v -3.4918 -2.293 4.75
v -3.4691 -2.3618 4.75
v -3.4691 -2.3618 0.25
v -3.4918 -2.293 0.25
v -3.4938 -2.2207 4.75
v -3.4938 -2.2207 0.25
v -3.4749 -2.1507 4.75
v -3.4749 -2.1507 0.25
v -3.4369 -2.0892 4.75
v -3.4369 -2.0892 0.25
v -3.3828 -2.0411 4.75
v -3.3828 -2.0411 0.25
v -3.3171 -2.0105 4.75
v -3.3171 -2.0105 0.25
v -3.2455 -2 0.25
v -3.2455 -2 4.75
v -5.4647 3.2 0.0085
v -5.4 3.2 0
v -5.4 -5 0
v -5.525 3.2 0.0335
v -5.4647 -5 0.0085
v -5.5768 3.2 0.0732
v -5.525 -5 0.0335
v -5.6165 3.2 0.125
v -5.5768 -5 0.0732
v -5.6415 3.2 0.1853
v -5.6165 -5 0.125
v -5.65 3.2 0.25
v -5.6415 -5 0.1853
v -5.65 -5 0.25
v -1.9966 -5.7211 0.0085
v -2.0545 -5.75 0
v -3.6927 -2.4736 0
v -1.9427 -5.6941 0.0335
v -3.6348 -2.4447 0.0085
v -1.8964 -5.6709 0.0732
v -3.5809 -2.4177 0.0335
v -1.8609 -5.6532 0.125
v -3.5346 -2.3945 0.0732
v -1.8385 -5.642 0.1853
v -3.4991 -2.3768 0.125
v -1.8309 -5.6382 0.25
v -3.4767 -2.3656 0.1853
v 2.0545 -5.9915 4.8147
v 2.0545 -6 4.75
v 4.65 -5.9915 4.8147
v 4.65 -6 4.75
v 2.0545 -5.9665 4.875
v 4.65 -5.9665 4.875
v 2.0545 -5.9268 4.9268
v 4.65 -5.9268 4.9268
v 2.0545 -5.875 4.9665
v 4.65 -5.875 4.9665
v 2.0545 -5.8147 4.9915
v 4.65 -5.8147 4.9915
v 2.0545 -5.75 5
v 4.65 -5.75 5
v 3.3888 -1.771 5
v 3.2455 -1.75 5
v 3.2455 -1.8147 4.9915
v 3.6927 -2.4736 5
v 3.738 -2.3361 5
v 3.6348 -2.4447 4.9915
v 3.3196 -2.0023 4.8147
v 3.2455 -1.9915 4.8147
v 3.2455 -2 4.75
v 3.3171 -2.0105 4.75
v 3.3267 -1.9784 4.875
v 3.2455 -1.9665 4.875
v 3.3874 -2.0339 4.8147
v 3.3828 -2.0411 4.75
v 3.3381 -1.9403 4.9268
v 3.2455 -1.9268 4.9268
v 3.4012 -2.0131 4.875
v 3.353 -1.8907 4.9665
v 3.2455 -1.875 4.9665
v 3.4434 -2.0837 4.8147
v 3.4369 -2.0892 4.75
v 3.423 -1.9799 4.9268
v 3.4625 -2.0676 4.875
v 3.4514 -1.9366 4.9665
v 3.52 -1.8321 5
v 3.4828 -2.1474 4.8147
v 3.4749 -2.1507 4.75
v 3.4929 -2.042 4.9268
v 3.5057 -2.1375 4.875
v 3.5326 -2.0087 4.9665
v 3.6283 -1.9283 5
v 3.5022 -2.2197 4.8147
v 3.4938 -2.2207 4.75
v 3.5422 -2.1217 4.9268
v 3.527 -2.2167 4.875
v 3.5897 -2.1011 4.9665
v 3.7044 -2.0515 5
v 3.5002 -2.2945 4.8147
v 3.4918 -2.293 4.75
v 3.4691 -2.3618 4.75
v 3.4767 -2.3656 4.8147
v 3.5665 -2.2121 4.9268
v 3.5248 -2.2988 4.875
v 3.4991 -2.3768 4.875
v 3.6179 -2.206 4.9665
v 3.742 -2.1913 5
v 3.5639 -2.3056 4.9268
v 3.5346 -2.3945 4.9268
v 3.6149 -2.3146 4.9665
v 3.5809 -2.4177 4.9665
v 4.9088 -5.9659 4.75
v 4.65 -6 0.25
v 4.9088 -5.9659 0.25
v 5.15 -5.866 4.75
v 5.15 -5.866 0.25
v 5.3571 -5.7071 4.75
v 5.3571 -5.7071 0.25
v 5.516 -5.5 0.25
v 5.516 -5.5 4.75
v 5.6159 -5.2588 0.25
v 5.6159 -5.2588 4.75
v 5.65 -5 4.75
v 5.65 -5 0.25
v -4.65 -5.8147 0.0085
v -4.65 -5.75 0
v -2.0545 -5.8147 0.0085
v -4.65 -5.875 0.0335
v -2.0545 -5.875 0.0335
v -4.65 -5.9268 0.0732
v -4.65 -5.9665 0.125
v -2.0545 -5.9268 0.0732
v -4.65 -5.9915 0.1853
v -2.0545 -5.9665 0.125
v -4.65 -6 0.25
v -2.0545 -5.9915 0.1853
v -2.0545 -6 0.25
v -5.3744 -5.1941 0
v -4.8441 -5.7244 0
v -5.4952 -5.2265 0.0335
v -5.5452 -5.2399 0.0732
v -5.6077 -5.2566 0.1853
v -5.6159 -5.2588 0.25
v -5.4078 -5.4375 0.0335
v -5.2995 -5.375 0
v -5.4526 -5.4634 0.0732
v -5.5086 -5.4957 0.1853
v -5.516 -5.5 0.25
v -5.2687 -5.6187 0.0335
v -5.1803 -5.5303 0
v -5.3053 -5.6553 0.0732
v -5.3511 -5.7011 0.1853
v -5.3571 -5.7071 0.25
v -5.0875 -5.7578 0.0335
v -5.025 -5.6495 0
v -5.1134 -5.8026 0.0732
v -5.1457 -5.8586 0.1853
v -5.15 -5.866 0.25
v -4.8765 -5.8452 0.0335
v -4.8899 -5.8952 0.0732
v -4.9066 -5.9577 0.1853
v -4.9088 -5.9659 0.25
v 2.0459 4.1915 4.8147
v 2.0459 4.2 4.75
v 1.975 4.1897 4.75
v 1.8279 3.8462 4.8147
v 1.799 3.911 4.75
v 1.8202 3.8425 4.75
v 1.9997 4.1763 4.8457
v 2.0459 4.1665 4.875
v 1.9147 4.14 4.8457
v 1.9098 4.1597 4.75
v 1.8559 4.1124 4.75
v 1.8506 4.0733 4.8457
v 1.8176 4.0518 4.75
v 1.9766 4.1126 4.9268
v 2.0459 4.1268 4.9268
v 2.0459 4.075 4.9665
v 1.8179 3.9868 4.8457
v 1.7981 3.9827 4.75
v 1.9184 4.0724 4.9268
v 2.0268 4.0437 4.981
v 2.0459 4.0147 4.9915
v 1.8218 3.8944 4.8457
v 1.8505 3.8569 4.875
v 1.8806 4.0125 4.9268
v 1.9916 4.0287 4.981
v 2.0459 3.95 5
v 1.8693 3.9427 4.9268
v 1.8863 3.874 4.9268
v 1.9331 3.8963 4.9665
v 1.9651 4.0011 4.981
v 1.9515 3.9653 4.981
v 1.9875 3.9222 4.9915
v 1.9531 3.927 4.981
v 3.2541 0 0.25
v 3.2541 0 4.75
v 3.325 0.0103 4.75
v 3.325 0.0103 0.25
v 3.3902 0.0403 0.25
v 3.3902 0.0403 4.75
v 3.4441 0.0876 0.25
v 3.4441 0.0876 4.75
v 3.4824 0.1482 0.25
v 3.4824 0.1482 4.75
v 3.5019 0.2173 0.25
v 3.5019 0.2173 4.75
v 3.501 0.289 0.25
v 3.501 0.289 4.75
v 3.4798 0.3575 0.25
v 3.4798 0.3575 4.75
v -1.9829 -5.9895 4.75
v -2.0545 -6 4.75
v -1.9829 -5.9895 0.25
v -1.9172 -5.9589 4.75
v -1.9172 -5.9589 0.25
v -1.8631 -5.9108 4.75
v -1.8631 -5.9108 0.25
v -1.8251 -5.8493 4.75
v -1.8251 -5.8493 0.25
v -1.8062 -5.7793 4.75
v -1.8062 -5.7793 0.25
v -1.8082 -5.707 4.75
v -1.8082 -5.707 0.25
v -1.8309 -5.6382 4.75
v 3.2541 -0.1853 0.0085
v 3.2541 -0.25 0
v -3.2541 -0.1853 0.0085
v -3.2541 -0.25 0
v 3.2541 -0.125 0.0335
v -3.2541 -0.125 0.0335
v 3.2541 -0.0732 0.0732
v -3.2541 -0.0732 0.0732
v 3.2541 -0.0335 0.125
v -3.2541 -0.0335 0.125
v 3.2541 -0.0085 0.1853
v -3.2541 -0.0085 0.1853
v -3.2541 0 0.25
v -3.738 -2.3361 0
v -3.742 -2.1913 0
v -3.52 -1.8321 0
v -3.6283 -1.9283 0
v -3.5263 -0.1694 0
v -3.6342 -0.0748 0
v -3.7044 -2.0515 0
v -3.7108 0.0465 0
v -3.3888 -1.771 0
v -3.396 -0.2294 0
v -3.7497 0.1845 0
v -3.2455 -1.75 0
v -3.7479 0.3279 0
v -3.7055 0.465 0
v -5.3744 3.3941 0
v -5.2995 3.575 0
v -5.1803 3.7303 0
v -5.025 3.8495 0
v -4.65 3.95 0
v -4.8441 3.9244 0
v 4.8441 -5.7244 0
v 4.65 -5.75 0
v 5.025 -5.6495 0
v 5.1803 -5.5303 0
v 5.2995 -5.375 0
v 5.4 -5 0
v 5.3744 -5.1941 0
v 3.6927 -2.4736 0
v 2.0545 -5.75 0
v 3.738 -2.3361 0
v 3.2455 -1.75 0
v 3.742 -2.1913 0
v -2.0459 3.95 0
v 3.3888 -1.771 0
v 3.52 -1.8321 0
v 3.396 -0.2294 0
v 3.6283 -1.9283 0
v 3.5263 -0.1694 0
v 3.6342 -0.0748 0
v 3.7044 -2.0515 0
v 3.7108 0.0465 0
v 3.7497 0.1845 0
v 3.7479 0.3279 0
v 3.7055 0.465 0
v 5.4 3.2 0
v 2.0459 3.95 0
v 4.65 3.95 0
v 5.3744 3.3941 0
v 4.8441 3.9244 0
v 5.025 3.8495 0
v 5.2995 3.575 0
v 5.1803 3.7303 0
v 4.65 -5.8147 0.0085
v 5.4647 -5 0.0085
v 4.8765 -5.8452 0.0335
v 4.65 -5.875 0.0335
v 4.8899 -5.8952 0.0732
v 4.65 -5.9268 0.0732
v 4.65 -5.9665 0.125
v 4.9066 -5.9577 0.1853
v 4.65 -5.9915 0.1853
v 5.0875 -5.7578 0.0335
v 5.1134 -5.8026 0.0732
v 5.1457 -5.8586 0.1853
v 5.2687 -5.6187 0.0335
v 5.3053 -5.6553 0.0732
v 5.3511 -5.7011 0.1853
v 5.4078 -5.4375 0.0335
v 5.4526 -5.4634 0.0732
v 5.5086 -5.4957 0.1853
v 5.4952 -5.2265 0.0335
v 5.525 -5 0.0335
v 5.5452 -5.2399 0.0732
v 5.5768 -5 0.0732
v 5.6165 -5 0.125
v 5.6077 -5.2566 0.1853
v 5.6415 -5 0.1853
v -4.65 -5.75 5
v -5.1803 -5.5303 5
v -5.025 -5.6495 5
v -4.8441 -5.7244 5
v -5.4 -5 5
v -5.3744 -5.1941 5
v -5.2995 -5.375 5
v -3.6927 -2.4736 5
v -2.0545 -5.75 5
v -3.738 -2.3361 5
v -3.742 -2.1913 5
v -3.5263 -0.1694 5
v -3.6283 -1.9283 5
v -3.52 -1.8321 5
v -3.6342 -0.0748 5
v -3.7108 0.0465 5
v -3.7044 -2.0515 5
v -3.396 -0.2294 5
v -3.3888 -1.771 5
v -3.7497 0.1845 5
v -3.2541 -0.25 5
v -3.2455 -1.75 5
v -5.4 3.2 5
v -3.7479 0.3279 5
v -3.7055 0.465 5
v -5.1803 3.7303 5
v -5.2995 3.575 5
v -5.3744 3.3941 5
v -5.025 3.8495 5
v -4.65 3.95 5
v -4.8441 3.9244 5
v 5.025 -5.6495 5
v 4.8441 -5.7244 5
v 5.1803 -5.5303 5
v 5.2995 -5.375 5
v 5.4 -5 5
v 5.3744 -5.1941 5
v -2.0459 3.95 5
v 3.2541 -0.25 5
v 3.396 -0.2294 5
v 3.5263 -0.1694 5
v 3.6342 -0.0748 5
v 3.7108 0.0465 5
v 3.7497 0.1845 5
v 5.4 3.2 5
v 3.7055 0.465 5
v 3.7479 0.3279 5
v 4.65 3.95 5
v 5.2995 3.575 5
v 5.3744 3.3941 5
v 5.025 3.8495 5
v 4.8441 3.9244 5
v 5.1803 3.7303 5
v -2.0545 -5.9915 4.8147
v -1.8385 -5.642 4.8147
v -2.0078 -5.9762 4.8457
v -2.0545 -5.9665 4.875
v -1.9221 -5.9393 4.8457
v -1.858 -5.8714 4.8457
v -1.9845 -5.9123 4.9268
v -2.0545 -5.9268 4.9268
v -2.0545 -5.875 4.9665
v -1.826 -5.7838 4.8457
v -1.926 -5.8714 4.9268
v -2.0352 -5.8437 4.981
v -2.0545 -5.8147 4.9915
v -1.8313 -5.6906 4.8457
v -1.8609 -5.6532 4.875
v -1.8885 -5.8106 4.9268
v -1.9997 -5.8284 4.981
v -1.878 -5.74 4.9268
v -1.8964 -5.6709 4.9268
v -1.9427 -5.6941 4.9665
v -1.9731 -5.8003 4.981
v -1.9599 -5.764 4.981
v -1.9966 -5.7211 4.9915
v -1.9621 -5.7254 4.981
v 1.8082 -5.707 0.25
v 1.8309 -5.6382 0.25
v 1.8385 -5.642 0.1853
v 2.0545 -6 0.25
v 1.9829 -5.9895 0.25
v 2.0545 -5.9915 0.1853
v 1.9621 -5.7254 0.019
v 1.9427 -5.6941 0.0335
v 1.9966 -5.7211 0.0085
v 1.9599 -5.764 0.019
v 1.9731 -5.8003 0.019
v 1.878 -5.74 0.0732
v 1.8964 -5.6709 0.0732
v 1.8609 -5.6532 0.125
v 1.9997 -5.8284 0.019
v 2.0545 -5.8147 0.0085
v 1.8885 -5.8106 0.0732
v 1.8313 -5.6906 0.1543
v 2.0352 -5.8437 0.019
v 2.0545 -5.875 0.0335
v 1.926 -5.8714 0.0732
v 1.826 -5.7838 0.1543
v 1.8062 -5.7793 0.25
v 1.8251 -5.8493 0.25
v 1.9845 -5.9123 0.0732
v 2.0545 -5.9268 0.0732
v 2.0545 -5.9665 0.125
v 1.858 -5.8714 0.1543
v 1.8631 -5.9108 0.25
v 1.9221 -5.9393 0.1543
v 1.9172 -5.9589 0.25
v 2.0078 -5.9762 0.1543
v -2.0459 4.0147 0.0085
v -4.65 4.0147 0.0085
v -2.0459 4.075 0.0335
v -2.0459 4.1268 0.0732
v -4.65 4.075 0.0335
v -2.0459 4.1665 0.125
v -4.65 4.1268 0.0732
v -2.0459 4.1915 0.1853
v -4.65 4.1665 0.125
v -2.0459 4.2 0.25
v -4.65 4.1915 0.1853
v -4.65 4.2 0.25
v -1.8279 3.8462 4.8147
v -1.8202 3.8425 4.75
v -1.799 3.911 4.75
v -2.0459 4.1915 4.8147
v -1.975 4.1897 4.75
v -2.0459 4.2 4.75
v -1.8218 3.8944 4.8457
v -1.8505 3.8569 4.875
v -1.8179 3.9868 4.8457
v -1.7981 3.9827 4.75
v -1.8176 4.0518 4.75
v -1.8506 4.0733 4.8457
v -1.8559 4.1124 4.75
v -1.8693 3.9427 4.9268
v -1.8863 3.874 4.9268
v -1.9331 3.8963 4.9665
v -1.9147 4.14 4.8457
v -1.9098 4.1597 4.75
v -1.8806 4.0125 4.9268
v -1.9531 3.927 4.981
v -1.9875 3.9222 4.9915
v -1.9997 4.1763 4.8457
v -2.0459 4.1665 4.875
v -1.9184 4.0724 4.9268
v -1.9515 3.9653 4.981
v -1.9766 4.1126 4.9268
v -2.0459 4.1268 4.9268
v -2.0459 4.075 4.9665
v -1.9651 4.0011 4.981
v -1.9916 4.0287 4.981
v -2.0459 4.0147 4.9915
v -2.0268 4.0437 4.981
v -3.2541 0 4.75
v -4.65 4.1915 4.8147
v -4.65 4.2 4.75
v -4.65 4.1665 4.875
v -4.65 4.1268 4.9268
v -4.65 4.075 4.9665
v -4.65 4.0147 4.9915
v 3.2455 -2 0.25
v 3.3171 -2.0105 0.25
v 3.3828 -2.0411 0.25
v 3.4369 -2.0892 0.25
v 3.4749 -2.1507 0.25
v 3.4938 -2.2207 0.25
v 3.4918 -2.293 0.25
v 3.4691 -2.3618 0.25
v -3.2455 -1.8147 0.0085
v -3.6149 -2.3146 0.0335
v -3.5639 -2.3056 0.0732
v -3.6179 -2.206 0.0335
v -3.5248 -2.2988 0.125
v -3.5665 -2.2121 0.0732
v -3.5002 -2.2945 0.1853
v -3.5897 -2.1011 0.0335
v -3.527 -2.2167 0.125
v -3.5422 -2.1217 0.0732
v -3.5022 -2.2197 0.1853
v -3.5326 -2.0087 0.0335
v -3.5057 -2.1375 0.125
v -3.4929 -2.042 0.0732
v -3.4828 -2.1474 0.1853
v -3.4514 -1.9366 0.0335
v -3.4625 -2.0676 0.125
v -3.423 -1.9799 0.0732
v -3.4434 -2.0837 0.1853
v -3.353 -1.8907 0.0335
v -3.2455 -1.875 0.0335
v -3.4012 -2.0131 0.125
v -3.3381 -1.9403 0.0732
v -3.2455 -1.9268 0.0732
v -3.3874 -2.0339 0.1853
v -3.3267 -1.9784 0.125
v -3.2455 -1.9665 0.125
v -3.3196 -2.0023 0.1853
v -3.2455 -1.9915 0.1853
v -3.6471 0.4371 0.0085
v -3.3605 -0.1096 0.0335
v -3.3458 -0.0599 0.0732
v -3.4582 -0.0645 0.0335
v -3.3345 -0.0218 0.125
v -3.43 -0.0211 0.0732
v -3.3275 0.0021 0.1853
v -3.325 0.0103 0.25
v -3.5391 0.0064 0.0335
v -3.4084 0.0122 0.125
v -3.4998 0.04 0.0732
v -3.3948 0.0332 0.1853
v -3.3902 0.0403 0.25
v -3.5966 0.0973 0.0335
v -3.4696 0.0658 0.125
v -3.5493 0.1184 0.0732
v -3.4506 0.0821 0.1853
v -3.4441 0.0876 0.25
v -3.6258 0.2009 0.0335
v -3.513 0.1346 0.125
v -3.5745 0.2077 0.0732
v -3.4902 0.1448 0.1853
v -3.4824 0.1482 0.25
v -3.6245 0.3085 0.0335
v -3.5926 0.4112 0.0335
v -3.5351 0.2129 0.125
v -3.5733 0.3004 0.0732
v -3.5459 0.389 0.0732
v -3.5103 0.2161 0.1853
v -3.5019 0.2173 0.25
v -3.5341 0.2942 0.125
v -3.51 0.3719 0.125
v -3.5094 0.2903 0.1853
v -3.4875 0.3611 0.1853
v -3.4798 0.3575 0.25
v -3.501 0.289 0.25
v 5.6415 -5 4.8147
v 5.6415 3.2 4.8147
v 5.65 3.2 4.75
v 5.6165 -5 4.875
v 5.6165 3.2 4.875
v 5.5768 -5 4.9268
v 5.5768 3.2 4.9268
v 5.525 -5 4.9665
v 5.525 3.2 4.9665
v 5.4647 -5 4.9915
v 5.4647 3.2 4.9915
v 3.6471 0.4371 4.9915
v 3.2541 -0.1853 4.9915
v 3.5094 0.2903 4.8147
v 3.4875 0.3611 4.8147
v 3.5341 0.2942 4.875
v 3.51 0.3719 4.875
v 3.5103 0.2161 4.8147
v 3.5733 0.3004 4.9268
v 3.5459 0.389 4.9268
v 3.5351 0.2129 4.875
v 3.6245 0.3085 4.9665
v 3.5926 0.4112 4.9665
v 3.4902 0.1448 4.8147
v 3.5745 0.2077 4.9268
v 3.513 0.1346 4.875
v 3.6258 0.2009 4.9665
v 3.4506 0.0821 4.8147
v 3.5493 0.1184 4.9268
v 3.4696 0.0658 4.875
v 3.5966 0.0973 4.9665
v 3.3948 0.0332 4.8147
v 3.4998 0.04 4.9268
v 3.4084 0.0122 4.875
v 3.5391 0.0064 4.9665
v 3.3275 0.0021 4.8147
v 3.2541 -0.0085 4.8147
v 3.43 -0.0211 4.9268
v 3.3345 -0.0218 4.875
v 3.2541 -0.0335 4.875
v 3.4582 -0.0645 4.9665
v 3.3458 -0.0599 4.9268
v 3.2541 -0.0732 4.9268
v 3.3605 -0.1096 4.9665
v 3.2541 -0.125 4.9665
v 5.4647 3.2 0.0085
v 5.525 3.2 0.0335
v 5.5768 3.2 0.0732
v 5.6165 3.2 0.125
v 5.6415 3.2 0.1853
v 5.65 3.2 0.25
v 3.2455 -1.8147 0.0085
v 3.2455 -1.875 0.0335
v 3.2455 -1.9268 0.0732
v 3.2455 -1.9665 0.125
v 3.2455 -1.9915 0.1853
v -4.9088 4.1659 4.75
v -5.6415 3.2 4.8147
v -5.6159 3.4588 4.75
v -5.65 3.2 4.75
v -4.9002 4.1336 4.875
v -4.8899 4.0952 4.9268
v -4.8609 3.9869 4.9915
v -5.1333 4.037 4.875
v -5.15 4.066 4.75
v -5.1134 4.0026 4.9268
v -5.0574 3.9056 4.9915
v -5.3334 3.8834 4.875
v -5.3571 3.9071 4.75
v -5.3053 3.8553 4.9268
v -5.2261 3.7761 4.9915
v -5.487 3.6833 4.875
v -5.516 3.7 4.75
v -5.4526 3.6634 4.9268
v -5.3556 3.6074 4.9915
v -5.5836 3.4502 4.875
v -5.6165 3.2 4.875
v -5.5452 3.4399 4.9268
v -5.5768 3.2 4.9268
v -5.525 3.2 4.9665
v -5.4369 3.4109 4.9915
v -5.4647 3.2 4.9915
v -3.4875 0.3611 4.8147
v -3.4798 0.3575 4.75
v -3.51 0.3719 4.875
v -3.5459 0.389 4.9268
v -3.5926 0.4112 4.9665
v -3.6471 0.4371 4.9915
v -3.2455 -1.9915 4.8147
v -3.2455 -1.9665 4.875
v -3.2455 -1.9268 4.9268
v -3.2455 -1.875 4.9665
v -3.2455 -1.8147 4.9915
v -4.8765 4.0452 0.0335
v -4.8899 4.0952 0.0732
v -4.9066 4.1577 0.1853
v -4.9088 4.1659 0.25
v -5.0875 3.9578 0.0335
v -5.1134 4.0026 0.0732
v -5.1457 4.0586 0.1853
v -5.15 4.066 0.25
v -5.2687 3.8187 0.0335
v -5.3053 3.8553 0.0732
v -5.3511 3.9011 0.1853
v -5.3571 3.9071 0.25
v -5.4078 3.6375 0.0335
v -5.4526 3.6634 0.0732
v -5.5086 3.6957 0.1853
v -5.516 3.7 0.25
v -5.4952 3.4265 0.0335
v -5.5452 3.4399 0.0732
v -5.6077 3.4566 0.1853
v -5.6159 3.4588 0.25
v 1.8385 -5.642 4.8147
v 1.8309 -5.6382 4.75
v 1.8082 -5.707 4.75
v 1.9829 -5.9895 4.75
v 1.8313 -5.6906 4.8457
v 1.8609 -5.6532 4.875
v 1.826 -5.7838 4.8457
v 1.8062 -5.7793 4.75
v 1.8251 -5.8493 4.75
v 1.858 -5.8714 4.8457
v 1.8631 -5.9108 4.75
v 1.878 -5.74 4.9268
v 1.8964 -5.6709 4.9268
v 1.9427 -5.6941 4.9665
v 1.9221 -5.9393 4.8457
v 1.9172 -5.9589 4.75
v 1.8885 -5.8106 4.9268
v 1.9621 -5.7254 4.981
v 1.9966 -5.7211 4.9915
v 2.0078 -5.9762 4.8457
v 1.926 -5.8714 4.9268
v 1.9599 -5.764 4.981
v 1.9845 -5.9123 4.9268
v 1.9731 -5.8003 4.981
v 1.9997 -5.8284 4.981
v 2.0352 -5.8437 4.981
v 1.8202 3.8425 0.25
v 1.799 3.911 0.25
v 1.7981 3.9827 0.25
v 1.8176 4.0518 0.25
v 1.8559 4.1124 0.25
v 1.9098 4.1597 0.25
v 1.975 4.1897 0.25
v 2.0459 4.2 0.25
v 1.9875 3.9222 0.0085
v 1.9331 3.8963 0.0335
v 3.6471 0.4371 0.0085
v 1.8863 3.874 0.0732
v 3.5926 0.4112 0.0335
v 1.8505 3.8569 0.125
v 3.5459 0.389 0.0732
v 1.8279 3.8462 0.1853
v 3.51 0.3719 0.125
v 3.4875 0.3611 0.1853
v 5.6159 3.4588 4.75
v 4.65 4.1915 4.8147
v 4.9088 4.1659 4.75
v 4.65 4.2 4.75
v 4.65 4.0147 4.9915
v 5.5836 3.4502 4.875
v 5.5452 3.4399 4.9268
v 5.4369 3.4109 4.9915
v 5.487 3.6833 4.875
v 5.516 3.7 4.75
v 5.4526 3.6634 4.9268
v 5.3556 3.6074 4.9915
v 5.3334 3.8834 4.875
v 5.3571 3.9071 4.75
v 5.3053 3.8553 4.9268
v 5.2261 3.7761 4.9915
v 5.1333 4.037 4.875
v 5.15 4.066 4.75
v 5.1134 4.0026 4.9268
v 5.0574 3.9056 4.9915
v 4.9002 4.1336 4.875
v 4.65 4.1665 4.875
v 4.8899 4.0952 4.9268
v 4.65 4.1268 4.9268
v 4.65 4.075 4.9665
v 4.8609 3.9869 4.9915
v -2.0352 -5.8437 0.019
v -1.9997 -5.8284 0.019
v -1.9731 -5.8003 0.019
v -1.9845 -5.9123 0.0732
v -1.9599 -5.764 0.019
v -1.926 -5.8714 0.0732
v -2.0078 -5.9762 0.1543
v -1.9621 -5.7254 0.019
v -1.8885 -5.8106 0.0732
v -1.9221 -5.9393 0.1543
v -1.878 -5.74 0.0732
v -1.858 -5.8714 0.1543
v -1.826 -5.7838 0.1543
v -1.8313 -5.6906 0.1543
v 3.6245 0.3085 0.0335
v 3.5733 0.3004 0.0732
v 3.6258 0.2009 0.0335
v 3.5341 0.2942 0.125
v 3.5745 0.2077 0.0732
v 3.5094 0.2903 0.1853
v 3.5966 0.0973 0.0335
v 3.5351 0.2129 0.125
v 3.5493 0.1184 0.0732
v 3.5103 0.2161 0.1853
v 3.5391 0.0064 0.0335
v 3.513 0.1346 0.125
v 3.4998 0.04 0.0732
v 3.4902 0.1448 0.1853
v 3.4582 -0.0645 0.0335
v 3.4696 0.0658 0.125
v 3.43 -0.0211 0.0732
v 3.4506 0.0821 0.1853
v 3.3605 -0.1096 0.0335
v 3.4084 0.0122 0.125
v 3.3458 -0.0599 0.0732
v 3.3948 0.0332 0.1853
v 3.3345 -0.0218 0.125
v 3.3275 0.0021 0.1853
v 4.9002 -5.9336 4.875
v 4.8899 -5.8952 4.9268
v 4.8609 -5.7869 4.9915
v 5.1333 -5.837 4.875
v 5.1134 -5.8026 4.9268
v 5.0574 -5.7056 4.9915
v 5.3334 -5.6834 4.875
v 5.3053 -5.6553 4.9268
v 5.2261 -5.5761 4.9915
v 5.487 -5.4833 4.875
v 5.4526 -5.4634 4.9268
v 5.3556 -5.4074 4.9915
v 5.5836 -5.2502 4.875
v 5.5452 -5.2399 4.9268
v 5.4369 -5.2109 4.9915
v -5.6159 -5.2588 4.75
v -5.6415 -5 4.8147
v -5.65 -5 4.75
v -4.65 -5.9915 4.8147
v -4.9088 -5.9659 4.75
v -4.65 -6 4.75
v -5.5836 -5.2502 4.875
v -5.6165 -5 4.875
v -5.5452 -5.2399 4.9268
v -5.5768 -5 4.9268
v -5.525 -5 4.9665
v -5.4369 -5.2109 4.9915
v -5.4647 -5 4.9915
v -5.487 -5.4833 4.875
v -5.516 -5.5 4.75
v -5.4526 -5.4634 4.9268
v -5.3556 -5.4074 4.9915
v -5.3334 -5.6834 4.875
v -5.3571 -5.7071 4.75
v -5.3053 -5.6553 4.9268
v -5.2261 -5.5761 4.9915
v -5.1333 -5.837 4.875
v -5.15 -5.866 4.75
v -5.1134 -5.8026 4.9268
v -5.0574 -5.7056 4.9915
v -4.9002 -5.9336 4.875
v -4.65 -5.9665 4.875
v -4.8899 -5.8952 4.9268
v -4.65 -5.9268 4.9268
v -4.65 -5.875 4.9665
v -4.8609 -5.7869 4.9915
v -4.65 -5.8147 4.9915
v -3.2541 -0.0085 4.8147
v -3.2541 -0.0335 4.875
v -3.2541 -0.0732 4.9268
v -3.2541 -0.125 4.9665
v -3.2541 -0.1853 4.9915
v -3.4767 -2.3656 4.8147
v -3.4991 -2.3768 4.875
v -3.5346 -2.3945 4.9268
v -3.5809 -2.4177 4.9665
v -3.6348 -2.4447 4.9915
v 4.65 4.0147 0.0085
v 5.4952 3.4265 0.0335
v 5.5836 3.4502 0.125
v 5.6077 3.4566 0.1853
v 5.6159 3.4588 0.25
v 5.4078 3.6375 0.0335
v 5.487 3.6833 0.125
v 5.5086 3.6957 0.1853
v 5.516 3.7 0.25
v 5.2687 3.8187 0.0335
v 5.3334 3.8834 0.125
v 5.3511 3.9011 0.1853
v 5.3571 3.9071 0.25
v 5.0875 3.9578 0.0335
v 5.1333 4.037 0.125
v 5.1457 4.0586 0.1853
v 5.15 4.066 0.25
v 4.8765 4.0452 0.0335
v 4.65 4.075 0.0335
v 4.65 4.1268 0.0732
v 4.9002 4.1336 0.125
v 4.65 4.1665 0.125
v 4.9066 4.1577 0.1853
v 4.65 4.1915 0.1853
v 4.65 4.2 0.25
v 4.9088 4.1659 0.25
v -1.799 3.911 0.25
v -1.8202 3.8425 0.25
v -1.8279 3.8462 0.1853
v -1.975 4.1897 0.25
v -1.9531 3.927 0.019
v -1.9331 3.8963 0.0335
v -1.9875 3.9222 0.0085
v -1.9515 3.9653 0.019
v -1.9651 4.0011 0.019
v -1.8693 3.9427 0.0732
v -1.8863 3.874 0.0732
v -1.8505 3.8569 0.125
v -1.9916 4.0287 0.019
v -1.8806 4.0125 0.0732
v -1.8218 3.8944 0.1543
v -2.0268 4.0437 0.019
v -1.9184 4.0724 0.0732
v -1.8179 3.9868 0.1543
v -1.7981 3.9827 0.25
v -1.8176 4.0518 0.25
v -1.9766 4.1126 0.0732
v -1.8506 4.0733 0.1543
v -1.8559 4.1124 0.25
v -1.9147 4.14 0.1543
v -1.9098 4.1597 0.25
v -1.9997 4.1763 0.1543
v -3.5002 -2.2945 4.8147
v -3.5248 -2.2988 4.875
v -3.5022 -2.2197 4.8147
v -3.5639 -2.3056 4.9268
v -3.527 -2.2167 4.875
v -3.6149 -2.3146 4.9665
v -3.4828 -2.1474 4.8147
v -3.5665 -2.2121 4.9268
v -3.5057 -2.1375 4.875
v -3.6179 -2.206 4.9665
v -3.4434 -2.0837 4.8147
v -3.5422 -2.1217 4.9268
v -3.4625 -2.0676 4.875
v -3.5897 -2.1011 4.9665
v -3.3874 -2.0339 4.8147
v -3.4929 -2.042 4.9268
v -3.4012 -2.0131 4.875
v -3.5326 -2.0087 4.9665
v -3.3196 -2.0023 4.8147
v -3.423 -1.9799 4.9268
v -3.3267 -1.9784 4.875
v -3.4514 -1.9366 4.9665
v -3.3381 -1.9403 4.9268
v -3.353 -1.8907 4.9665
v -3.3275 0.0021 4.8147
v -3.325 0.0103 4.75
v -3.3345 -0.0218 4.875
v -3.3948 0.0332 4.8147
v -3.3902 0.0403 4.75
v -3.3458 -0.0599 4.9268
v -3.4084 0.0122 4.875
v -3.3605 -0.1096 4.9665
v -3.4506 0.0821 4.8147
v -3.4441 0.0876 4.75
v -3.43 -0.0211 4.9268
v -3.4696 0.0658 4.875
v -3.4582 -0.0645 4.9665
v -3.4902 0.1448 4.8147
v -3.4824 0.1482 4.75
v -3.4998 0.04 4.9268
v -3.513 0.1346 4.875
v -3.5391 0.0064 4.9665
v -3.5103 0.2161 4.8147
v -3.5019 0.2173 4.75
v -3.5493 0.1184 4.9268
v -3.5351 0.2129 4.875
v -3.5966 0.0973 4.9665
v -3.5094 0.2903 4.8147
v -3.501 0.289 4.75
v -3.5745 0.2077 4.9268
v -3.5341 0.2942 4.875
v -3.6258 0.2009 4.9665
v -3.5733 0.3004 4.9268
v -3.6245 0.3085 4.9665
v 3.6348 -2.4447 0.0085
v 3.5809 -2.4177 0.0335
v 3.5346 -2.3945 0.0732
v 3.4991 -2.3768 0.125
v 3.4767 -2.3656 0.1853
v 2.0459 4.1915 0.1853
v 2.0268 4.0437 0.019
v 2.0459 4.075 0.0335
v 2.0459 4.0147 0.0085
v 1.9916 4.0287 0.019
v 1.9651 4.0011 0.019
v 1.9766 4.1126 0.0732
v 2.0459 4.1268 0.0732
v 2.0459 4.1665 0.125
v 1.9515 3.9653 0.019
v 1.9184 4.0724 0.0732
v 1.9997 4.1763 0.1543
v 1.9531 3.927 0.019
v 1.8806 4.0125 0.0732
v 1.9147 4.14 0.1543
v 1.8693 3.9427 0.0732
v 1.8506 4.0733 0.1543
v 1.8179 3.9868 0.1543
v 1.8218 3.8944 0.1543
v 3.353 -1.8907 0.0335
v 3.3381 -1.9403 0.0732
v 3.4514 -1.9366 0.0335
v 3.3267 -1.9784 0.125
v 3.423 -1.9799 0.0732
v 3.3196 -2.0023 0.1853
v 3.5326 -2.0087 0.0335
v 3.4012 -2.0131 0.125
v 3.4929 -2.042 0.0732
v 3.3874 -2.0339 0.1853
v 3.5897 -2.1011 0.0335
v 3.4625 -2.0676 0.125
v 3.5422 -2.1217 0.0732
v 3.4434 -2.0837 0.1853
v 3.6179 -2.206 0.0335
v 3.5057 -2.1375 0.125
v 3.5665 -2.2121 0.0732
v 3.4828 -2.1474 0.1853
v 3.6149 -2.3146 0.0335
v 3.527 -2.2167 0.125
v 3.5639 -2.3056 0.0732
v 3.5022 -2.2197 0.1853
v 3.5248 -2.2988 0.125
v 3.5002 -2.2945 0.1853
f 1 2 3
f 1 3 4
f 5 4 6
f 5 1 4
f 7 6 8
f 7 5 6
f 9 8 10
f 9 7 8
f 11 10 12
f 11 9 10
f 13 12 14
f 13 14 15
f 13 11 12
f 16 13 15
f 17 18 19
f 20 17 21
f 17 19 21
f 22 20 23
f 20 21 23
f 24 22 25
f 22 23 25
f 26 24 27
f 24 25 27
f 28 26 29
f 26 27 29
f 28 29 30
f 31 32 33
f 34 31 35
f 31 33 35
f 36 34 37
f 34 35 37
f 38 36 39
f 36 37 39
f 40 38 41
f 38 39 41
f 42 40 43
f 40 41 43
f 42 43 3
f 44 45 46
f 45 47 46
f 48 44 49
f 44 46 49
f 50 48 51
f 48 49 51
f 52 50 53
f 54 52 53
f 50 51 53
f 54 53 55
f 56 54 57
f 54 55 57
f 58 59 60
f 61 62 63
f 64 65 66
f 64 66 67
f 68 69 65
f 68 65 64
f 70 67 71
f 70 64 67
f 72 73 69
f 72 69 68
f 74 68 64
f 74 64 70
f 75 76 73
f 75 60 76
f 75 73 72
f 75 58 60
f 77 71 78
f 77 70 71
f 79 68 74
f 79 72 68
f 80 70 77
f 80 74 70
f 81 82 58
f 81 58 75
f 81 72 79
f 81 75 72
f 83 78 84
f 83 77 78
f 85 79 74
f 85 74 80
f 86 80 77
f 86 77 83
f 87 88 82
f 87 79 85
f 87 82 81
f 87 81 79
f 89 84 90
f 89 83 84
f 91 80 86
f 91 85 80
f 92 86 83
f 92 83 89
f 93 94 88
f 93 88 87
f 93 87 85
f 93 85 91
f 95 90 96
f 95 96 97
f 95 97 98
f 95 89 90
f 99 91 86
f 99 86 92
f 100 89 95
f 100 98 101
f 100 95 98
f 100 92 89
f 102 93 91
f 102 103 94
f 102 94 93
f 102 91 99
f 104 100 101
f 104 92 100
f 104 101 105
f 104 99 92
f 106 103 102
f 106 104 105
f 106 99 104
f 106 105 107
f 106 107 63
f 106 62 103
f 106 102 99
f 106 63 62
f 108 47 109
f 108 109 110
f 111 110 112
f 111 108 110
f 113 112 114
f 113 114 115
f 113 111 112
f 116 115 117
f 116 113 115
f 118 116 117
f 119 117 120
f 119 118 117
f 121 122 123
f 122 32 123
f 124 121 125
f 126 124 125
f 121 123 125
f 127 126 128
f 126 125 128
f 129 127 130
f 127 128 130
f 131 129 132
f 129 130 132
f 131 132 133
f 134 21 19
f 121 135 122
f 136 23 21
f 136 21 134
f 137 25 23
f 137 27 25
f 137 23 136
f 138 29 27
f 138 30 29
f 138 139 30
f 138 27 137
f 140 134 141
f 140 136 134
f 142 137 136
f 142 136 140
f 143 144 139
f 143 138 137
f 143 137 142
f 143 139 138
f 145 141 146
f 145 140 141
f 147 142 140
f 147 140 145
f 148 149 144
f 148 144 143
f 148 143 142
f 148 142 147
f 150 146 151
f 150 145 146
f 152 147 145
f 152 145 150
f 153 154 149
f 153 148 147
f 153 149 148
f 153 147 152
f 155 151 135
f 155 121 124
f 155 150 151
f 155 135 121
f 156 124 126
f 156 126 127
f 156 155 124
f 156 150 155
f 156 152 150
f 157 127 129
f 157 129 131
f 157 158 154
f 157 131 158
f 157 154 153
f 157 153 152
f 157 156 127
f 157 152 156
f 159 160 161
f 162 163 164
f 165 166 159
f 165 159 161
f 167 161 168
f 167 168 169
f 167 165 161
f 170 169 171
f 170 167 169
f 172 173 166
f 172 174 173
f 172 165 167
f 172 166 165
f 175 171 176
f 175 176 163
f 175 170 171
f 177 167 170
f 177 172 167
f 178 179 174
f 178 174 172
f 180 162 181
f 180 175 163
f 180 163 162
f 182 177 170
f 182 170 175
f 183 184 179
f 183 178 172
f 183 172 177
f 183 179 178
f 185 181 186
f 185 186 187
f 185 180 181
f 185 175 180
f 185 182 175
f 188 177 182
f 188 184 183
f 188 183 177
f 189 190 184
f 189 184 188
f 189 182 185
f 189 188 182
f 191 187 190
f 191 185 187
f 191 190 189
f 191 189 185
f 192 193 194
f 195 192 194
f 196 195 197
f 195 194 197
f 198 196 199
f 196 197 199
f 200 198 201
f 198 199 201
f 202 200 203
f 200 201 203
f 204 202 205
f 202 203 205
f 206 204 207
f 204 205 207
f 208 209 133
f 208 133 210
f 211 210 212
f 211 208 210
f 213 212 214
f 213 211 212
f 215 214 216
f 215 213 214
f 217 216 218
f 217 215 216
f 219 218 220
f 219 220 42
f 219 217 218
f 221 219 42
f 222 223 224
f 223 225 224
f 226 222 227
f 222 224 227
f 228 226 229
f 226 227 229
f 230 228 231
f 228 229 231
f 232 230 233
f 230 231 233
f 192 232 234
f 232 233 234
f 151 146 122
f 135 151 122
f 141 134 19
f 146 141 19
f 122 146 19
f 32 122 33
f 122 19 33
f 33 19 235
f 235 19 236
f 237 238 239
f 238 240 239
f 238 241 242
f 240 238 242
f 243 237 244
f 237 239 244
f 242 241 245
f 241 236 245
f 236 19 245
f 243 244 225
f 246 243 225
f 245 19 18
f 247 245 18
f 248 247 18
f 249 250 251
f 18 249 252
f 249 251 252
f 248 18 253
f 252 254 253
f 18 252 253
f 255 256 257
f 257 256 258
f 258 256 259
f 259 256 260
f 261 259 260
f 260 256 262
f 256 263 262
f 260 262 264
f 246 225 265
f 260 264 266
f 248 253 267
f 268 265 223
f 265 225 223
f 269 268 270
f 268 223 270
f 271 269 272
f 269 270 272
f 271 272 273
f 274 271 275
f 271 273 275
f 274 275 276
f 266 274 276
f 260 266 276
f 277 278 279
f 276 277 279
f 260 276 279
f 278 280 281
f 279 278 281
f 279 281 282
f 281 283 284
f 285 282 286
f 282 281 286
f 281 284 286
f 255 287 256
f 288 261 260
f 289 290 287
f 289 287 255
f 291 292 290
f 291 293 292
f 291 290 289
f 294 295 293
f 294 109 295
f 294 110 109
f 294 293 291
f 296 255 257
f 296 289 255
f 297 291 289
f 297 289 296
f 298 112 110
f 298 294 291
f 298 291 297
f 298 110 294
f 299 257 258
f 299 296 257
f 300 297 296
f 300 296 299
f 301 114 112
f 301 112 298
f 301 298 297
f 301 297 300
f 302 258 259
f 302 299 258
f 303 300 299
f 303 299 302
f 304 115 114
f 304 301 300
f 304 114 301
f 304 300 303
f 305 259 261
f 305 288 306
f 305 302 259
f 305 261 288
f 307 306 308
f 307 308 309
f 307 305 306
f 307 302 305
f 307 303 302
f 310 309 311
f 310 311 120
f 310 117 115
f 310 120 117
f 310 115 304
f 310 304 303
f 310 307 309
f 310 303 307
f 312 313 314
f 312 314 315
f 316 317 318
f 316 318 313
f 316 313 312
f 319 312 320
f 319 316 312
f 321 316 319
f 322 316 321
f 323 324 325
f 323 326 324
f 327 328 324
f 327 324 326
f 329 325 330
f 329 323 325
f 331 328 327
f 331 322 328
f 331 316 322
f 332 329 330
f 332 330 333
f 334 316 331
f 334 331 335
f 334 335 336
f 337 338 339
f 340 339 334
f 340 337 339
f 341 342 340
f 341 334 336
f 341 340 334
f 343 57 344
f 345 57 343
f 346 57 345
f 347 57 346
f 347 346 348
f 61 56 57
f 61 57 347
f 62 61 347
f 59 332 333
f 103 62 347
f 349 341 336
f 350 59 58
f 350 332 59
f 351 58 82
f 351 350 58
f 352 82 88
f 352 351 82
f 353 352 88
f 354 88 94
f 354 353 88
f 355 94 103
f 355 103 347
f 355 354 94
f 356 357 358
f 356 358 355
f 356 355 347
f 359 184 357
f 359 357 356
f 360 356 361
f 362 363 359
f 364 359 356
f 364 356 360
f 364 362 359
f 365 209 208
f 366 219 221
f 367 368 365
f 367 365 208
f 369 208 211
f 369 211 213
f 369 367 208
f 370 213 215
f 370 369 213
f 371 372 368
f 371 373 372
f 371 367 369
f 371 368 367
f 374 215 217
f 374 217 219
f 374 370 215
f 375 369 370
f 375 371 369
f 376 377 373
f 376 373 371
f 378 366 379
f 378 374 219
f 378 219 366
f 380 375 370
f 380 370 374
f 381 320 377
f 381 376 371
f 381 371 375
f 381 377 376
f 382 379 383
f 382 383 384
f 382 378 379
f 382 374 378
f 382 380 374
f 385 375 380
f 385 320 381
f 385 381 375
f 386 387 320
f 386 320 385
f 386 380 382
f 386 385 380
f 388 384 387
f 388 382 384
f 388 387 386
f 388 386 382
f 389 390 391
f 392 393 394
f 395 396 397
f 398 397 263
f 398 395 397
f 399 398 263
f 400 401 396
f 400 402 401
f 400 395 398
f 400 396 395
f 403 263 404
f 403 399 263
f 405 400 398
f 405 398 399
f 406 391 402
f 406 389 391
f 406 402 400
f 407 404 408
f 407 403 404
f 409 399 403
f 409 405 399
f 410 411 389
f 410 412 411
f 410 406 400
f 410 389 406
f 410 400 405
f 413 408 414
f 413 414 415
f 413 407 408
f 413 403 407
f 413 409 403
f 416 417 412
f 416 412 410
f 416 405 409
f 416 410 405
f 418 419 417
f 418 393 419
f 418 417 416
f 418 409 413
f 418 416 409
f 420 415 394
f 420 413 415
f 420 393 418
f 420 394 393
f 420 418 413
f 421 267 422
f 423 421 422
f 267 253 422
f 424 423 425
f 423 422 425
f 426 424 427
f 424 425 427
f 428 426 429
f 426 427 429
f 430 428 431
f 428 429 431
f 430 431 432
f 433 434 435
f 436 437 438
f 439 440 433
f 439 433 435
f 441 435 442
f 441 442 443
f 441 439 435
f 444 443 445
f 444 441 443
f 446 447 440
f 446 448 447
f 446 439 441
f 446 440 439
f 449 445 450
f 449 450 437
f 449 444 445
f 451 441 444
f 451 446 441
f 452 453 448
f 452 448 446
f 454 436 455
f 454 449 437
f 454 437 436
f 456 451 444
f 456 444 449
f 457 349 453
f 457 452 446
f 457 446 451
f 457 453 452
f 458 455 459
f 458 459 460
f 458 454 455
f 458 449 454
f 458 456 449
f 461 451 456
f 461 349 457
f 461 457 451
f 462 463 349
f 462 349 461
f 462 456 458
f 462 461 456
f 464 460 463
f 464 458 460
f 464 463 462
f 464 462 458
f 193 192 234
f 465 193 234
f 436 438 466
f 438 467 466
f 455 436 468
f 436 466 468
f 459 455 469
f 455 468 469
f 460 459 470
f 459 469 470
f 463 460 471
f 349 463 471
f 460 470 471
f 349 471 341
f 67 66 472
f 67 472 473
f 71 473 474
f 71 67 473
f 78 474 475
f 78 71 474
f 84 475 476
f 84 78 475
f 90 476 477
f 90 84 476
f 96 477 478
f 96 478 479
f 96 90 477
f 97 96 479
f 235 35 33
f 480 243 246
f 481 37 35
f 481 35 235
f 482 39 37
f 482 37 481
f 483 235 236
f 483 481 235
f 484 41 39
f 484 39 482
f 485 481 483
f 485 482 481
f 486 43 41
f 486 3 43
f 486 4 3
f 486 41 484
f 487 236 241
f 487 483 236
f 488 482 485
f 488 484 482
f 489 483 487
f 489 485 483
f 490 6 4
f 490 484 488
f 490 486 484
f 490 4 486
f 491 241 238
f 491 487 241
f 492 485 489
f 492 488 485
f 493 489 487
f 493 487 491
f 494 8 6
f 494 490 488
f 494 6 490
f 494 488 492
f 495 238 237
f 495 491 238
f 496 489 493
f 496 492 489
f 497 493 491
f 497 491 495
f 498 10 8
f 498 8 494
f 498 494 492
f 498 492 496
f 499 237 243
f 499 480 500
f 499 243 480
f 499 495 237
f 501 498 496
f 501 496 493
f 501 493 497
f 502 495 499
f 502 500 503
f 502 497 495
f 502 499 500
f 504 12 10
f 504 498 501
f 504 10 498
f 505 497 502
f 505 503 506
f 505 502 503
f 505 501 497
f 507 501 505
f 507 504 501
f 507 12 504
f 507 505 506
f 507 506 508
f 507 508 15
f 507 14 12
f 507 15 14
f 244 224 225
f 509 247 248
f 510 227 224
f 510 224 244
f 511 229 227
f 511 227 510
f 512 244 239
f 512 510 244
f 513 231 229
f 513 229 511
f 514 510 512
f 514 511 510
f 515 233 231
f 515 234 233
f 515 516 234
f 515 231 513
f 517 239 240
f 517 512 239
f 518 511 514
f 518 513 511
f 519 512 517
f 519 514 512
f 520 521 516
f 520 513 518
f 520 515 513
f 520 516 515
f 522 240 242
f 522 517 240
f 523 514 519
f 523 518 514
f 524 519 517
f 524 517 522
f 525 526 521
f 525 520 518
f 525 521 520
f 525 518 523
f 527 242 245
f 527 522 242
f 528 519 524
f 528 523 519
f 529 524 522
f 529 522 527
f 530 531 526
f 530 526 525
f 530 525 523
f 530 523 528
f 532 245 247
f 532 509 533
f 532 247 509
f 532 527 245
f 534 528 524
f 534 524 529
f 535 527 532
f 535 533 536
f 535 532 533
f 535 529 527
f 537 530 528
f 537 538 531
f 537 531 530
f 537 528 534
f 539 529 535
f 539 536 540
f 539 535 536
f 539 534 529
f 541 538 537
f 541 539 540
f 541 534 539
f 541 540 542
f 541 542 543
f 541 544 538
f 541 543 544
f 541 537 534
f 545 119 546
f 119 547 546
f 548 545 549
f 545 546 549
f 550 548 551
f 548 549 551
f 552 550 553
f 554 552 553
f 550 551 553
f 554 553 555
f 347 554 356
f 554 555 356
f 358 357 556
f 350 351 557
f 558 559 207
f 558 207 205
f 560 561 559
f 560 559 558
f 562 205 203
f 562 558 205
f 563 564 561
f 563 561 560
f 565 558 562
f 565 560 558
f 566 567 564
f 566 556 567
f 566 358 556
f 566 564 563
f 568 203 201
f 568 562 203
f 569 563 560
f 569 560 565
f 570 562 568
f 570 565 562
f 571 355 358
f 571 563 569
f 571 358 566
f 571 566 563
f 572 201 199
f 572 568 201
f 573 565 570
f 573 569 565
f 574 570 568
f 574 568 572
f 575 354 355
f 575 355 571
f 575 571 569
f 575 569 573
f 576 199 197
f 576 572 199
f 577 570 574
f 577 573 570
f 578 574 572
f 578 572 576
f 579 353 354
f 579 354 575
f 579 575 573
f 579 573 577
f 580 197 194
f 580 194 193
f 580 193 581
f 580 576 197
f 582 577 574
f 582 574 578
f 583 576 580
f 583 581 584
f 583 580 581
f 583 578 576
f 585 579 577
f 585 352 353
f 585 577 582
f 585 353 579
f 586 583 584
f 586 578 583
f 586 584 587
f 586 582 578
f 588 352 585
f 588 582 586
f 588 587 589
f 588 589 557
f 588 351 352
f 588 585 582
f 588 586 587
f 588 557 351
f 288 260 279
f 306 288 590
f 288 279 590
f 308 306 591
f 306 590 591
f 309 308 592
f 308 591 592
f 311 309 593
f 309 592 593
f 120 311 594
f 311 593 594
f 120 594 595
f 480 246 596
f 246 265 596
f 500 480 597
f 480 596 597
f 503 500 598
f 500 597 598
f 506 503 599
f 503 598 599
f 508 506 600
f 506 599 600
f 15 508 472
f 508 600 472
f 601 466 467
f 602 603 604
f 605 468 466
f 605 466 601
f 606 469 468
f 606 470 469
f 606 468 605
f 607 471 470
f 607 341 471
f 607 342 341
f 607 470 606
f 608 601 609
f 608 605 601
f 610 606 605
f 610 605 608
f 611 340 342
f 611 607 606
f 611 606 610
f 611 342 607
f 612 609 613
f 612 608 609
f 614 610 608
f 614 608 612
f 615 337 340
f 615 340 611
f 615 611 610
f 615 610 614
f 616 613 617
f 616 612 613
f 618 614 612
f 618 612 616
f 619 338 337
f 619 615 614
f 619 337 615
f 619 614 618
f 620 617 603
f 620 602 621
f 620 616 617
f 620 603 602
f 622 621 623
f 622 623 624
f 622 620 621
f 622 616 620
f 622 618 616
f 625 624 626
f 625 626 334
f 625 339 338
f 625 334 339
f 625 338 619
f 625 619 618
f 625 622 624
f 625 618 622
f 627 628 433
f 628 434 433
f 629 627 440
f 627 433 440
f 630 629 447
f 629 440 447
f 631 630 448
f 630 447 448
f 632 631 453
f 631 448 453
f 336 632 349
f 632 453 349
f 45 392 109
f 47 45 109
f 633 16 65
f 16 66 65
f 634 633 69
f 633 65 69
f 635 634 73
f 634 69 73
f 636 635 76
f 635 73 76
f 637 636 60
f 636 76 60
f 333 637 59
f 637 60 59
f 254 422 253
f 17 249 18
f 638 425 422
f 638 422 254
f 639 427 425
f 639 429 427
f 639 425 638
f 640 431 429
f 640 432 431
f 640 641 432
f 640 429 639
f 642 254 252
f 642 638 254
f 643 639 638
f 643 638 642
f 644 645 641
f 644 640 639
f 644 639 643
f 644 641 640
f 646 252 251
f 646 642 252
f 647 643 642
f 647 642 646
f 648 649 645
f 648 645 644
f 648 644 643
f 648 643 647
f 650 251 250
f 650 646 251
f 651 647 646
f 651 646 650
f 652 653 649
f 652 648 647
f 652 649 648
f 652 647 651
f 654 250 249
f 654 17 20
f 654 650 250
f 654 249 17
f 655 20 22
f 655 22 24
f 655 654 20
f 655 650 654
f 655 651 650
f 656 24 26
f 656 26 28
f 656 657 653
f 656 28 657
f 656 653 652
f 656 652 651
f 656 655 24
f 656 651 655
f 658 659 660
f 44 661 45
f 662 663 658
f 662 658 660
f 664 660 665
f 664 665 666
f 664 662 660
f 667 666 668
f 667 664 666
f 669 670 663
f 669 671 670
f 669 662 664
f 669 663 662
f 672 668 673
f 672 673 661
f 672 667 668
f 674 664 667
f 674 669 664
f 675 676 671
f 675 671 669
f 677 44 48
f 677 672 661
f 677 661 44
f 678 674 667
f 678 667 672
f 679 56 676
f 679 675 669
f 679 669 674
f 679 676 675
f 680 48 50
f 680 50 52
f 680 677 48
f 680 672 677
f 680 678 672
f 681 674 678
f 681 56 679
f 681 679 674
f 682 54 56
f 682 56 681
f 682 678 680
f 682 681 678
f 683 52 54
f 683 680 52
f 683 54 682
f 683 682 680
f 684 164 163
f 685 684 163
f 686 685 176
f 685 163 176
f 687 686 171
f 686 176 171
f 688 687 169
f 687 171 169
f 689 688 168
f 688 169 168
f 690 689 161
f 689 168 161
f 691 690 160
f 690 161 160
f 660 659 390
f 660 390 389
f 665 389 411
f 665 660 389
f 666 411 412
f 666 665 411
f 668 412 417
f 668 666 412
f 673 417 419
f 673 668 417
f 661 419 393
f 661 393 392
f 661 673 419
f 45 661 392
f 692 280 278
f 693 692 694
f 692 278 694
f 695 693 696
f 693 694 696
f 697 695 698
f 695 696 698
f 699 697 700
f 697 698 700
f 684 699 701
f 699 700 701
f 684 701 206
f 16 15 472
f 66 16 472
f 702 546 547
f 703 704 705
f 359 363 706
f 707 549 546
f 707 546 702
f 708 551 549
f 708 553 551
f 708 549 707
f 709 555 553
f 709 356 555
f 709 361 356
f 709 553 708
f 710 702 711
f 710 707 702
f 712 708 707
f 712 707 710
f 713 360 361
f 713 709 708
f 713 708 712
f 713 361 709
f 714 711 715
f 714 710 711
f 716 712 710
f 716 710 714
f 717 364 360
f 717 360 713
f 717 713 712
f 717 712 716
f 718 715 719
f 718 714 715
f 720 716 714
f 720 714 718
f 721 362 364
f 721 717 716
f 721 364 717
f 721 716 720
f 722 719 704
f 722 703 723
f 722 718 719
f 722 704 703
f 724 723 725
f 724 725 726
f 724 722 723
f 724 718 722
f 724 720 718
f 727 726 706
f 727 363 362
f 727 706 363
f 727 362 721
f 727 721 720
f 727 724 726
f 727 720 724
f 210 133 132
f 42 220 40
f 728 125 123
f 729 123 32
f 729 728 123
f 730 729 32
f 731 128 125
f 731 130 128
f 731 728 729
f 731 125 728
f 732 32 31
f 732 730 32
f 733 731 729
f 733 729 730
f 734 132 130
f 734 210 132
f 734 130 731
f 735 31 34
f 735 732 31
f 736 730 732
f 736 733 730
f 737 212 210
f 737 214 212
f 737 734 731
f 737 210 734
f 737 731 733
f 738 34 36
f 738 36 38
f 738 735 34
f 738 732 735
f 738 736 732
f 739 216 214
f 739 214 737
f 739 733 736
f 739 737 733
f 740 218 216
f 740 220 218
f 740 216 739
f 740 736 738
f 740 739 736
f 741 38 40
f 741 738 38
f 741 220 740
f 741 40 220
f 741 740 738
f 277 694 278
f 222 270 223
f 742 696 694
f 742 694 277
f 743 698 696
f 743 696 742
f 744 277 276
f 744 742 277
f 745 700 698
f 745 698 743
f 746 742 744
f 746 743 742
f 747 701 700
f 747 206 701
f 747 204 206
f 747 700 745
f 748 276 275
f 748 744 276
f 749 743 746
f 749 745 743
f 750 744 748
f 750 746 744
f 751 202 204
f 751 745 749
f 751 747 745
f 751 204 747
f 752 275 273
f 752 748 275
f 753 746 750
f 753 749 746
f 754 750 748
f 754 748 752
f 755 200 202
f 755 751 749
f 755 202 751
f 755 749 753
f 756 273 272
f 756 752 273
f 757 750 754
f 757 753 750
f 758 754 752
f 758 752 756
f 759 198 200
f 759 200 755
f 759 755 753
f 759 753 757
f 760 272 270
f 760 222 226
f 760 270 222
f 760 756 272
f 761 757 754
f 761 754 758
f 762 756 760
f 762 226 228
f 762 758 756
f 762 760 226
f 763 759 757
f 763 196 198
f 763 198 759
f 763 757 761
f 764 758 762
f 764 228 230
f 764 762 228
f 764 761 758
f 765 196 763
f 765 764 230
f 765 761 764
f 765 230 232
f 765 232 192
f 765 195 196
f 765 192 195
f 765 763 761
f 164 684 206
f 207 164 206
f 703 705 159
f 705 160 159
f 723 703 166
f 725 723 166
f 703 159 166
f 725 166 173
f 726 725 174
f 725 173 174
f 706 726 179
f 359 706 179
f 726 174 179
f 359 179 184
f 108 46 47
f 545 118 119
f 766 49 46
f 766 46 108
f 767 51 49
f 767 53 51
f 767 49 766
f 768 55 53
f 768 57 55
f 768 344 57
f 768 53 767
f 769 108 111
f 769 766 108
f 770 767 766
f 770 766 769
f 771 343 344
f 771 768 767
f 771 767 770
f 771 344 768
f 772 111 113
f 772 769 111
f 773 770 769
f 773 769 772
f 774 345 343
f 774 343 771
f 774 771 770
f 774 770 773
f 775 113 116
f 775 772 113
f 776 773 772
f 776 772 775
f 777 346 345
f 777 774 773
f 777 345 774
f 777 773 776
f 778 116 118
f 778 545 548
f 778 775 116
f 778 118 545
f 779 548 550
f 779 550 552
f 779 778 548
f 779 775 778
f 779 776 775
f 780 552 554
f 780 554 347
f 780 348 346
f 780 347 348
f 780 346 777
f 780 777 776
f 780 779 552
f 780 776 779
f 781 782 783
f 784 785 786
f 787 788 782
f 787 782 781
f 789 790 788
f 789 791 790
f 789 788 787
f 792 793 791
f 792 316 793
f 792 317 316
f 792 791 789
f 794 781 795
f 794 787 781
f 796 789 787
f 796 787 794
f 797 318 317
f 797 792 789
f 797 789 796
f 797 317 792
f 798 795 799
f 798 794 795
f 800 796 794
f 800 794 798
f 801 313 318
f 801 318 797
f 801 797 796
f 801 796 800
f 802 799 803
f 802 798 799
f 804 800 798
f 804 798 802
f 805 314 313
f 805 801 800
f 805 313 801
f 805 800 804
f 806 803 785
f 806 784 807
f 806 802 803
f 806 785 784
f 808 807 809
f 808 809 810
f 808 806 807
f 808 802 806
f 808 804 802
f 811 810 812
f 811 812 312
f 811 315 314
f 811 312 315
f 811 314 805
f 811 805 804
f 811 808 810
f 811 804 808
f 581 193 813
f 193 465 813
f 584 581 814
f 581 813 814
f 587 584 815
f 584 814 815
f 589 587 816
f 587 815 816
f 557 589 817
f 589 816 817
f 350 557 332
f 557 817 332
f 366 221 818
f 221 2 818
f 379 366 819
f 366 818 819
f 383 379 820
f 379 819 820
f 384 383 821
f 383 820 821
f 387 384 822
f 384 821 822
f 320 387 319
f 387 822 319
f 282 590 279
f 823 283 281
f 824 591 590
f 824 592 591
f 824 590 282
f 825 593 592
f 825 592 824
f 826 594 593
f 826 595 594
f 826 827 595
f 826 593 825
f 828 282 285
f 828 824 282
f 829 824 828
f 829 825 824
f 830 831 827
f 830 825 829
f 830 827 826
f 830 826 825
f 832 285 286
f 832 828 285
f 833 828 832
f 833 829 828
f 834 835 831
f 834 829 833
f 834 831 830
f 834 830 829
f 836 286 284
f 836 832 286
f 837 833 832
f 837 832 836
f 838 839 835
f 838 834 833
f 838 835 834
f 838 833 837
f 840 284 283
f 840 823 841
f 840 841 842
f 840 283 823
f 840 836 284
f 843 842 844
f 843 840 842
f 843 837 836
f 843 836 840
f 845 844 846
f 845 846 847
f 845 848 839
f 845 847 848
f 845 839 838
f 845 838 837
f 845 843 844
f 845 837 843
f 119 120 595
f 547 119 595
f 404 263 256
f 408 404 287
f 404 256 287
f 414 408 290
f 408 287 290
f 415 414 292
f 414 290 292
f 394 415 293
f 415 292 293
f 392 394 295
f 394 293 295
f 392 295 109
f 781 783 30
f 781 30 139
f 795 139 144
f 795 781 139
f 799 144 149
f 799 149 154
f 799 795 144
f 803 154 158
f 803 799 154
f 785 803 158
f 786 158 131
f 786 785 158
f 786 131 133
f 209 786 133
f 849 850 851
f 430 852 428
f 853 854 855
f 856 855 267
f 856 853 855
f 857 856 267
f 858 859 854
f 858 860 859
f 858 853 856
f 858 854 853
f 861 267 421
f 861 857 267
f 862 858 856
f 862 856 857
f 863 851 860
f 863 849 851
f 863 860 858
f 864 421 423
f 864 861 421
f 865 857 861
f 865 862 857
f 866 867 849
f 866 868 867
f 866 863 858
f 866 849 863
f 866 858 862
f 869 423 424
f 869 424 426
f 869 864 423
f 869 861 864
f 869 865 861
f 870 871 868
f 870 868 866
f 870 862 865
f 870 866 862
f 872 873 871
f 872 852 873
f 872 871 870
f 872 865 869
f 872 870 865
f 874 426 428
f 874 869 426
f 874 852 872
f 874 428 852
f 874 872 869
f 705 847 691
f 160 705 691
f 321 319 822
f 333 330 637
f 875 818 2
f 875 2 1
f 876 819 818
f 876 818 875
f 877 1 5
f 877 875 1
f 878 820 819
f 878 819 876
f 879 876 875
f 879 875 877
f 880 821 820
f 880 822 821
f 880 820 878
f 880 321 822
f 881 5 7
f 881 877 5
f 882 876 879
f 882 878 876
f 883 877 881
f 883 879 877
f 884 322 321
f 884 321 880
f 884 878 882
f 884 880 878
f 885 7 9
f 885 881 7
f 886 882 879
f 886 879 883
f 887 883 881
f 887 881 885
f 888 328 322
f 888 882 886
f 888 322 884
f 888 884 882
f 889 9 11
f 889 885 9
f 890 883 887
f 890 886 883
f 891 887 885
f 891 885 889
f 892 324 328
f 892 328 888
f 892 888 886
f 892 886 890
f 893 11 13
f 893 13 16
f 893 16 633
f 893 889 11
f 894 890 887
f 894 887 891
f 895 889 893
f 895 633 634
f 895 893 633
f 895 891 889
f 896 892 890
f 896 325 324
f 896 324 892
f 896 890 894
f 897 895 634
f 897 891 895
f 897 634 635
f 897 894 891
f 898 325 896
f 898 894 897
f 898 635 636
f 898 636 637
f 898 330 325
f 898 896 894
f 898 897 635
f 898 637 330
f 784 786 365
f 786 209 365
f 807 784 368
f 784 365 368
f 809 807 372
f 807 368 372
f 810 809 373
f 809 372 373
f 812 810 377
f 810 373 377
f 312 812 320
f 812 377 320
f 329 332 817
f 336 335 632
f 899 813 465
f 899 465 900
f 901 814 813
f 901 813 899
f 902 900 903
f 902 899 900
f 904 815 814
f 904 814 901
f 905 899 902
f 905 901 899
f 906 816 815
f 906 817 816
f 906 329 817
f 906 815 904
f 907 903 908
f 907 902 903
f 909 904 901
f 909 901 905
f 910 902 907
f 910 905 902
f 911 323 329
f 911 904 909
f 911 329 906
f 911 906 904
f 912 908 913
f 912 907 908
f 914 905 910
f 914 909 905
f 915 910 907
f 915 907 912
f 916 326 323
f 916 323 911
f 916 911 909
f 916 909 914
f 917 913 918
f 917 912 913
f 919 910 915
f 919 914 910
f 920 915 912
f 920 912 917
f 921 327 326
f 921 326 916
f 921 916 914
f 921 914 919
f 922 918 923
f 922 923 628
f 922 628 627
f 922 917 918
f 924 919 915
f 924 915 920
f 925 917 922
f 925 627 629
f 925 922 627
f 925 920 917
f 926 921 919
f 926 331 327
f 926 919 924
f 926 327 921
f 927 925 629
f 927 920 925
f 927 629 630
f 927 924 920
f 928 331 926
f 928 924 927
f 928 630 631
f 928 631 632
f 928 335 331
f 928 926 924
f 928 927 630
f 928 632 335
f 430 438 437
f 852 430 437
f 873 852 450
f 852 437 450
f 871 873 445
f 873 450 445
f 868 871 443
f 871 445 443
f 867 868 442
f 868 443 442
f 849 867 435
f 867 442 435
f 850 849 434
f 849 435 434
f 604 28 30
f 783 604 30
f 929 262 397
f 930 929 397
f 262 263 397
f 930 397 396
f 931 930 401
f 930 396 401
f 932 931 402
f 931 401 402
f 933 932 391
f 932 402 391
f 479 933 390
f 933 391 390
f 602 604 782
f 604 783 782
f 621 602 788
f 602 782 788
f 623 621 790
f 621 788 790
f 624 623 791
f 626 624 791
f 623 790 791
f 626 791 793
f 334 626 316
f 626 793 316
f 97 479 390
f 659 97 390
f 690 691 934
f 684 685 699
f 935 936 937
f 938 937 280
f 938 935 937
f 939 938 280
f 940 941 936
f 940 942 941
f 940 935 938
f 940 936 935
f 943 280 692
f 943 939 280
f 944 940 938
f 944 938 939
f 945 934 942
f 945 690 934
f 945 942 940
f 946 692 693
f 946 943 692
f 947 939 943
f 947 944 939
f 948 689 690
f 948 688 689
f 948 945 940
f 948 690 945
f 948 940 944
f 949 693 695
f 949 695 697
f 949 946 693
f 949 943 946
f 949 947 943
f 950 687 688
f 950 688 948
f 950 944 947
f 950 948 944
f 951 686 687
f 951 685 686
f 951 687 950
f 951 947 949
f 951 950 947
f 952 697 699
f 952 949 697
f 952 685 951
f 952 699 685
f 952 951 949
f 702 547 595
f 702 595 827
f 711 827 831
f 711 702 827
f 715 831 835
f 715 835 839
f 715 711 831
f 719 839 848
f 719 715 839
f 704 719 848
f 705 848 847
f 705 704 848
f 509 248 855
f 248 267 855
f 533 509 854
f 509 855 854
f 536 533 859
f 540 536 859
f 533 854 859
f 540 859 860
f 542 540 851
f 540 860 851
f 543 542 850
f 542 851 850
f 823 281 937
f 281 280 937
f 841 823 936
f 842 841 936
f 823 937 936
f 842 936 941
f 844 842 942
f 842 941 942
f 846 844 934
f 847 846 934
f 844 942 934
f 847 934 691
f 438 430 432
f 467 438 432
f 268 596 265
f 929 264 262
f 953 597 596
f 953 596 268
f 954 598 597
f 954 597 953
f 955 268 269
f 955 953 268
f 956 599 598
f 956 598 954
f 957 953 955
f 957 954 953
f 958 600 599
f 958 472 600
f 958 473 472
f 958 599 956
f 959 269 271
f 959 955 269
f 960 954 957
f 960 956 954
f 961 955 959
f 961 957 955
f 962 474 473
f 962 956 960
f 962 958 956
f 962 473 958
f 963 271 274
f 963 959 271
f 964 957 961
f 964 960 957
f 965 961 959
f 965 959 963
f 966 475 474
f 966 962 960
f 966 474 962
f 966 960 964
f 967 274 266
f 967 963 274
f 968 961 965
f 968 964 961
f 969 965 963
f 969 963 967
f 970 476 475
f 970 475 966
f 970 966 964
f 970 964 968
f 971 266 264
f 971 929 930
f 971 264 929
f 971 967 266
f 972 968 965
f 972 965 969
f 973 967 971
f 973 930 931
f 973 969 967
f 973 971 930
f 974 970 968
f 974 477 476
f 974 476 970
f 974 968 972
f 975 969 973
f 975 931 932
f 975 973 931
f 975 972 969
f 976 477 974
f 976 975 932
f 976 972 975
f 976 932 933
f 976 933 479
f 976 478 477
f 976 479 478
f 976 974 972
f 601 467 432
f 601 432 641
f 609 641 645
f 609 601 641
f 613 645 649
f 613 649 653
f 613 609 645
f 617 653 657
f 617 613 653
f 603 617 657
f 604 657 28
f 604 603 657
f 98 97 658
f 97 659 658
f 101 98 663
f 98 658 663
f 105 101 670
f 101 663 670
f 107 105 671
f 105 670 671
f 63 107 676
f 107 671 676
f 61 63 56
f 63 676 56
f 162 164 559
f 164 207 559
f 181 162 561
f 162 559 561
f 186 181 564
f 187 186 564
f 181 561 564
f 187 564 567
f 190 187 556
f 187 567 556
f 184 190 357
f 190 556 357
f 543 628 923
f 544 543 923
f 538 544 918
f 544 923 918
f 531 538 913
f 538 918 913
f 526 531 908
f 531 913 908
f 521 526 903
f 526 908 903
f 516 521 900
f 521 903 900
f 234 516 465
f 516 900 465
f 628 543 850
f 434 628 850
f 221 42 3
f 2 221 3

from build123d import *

# Parameters (mm, degrees)
F1_DEPTH = 5
F2_R     = 1
F3_R     = 0.25
F4_R     = 0.25


with BuildPart() as f1:
    # F0 (on Top) → F1 (new body)
    with BuildSketch(Plane.XY):
        Polygon((3.65, 0), (-3.65, 0), (-1.65, 4.2), (-5.65, 4.2), (-5.65, -6), (-1.65, -6), (-3.65, -2), (3.65, -2), (1.65, -6), (5.65, -6), (5.65, 0), (5.65, 4.2), (1.65, 4.2), align=None)
    extrude(amount=F1_DEPTH)

    # F2
    f2_edges = [f1.edges().sort_by_distance(p)[0] for p in [
        (-5.65, -6, 2.5),
        (-5.65, 4.2, 2.5),
        (5.65, -6, 2.5),
        (5.65, 4.2, 2.5),
    ]]
    fillet(f2_edges, radius=F2_R)

    # F3
    f3_edges = [f1.edges().sort_by_distance(p)[0] for p in [
        (1.65, 4.2, 2.5),
        (-1.65, 4.2, 2.5),
        (3.65, 0, 2.5),
        (-3.65, 0, 2.5),
        (-3.65, -2, 2.5),
        (3.65, -2, 2.5),
        (1.65, -6, 2.5),
        (-1.65, -6, 2.5),
    ]]
    fillet(f3_edges, radius=F3_R)

    # F4
    f4_edges = [f1.edges().sort_by_distance(p)[0] for p in [
        (-5.357107, 3.907107, 5),
        (3.347973, 4.2, 0),
    ]]
    fillet(f4_edges, radius=F4_R)


solid = f1.part
